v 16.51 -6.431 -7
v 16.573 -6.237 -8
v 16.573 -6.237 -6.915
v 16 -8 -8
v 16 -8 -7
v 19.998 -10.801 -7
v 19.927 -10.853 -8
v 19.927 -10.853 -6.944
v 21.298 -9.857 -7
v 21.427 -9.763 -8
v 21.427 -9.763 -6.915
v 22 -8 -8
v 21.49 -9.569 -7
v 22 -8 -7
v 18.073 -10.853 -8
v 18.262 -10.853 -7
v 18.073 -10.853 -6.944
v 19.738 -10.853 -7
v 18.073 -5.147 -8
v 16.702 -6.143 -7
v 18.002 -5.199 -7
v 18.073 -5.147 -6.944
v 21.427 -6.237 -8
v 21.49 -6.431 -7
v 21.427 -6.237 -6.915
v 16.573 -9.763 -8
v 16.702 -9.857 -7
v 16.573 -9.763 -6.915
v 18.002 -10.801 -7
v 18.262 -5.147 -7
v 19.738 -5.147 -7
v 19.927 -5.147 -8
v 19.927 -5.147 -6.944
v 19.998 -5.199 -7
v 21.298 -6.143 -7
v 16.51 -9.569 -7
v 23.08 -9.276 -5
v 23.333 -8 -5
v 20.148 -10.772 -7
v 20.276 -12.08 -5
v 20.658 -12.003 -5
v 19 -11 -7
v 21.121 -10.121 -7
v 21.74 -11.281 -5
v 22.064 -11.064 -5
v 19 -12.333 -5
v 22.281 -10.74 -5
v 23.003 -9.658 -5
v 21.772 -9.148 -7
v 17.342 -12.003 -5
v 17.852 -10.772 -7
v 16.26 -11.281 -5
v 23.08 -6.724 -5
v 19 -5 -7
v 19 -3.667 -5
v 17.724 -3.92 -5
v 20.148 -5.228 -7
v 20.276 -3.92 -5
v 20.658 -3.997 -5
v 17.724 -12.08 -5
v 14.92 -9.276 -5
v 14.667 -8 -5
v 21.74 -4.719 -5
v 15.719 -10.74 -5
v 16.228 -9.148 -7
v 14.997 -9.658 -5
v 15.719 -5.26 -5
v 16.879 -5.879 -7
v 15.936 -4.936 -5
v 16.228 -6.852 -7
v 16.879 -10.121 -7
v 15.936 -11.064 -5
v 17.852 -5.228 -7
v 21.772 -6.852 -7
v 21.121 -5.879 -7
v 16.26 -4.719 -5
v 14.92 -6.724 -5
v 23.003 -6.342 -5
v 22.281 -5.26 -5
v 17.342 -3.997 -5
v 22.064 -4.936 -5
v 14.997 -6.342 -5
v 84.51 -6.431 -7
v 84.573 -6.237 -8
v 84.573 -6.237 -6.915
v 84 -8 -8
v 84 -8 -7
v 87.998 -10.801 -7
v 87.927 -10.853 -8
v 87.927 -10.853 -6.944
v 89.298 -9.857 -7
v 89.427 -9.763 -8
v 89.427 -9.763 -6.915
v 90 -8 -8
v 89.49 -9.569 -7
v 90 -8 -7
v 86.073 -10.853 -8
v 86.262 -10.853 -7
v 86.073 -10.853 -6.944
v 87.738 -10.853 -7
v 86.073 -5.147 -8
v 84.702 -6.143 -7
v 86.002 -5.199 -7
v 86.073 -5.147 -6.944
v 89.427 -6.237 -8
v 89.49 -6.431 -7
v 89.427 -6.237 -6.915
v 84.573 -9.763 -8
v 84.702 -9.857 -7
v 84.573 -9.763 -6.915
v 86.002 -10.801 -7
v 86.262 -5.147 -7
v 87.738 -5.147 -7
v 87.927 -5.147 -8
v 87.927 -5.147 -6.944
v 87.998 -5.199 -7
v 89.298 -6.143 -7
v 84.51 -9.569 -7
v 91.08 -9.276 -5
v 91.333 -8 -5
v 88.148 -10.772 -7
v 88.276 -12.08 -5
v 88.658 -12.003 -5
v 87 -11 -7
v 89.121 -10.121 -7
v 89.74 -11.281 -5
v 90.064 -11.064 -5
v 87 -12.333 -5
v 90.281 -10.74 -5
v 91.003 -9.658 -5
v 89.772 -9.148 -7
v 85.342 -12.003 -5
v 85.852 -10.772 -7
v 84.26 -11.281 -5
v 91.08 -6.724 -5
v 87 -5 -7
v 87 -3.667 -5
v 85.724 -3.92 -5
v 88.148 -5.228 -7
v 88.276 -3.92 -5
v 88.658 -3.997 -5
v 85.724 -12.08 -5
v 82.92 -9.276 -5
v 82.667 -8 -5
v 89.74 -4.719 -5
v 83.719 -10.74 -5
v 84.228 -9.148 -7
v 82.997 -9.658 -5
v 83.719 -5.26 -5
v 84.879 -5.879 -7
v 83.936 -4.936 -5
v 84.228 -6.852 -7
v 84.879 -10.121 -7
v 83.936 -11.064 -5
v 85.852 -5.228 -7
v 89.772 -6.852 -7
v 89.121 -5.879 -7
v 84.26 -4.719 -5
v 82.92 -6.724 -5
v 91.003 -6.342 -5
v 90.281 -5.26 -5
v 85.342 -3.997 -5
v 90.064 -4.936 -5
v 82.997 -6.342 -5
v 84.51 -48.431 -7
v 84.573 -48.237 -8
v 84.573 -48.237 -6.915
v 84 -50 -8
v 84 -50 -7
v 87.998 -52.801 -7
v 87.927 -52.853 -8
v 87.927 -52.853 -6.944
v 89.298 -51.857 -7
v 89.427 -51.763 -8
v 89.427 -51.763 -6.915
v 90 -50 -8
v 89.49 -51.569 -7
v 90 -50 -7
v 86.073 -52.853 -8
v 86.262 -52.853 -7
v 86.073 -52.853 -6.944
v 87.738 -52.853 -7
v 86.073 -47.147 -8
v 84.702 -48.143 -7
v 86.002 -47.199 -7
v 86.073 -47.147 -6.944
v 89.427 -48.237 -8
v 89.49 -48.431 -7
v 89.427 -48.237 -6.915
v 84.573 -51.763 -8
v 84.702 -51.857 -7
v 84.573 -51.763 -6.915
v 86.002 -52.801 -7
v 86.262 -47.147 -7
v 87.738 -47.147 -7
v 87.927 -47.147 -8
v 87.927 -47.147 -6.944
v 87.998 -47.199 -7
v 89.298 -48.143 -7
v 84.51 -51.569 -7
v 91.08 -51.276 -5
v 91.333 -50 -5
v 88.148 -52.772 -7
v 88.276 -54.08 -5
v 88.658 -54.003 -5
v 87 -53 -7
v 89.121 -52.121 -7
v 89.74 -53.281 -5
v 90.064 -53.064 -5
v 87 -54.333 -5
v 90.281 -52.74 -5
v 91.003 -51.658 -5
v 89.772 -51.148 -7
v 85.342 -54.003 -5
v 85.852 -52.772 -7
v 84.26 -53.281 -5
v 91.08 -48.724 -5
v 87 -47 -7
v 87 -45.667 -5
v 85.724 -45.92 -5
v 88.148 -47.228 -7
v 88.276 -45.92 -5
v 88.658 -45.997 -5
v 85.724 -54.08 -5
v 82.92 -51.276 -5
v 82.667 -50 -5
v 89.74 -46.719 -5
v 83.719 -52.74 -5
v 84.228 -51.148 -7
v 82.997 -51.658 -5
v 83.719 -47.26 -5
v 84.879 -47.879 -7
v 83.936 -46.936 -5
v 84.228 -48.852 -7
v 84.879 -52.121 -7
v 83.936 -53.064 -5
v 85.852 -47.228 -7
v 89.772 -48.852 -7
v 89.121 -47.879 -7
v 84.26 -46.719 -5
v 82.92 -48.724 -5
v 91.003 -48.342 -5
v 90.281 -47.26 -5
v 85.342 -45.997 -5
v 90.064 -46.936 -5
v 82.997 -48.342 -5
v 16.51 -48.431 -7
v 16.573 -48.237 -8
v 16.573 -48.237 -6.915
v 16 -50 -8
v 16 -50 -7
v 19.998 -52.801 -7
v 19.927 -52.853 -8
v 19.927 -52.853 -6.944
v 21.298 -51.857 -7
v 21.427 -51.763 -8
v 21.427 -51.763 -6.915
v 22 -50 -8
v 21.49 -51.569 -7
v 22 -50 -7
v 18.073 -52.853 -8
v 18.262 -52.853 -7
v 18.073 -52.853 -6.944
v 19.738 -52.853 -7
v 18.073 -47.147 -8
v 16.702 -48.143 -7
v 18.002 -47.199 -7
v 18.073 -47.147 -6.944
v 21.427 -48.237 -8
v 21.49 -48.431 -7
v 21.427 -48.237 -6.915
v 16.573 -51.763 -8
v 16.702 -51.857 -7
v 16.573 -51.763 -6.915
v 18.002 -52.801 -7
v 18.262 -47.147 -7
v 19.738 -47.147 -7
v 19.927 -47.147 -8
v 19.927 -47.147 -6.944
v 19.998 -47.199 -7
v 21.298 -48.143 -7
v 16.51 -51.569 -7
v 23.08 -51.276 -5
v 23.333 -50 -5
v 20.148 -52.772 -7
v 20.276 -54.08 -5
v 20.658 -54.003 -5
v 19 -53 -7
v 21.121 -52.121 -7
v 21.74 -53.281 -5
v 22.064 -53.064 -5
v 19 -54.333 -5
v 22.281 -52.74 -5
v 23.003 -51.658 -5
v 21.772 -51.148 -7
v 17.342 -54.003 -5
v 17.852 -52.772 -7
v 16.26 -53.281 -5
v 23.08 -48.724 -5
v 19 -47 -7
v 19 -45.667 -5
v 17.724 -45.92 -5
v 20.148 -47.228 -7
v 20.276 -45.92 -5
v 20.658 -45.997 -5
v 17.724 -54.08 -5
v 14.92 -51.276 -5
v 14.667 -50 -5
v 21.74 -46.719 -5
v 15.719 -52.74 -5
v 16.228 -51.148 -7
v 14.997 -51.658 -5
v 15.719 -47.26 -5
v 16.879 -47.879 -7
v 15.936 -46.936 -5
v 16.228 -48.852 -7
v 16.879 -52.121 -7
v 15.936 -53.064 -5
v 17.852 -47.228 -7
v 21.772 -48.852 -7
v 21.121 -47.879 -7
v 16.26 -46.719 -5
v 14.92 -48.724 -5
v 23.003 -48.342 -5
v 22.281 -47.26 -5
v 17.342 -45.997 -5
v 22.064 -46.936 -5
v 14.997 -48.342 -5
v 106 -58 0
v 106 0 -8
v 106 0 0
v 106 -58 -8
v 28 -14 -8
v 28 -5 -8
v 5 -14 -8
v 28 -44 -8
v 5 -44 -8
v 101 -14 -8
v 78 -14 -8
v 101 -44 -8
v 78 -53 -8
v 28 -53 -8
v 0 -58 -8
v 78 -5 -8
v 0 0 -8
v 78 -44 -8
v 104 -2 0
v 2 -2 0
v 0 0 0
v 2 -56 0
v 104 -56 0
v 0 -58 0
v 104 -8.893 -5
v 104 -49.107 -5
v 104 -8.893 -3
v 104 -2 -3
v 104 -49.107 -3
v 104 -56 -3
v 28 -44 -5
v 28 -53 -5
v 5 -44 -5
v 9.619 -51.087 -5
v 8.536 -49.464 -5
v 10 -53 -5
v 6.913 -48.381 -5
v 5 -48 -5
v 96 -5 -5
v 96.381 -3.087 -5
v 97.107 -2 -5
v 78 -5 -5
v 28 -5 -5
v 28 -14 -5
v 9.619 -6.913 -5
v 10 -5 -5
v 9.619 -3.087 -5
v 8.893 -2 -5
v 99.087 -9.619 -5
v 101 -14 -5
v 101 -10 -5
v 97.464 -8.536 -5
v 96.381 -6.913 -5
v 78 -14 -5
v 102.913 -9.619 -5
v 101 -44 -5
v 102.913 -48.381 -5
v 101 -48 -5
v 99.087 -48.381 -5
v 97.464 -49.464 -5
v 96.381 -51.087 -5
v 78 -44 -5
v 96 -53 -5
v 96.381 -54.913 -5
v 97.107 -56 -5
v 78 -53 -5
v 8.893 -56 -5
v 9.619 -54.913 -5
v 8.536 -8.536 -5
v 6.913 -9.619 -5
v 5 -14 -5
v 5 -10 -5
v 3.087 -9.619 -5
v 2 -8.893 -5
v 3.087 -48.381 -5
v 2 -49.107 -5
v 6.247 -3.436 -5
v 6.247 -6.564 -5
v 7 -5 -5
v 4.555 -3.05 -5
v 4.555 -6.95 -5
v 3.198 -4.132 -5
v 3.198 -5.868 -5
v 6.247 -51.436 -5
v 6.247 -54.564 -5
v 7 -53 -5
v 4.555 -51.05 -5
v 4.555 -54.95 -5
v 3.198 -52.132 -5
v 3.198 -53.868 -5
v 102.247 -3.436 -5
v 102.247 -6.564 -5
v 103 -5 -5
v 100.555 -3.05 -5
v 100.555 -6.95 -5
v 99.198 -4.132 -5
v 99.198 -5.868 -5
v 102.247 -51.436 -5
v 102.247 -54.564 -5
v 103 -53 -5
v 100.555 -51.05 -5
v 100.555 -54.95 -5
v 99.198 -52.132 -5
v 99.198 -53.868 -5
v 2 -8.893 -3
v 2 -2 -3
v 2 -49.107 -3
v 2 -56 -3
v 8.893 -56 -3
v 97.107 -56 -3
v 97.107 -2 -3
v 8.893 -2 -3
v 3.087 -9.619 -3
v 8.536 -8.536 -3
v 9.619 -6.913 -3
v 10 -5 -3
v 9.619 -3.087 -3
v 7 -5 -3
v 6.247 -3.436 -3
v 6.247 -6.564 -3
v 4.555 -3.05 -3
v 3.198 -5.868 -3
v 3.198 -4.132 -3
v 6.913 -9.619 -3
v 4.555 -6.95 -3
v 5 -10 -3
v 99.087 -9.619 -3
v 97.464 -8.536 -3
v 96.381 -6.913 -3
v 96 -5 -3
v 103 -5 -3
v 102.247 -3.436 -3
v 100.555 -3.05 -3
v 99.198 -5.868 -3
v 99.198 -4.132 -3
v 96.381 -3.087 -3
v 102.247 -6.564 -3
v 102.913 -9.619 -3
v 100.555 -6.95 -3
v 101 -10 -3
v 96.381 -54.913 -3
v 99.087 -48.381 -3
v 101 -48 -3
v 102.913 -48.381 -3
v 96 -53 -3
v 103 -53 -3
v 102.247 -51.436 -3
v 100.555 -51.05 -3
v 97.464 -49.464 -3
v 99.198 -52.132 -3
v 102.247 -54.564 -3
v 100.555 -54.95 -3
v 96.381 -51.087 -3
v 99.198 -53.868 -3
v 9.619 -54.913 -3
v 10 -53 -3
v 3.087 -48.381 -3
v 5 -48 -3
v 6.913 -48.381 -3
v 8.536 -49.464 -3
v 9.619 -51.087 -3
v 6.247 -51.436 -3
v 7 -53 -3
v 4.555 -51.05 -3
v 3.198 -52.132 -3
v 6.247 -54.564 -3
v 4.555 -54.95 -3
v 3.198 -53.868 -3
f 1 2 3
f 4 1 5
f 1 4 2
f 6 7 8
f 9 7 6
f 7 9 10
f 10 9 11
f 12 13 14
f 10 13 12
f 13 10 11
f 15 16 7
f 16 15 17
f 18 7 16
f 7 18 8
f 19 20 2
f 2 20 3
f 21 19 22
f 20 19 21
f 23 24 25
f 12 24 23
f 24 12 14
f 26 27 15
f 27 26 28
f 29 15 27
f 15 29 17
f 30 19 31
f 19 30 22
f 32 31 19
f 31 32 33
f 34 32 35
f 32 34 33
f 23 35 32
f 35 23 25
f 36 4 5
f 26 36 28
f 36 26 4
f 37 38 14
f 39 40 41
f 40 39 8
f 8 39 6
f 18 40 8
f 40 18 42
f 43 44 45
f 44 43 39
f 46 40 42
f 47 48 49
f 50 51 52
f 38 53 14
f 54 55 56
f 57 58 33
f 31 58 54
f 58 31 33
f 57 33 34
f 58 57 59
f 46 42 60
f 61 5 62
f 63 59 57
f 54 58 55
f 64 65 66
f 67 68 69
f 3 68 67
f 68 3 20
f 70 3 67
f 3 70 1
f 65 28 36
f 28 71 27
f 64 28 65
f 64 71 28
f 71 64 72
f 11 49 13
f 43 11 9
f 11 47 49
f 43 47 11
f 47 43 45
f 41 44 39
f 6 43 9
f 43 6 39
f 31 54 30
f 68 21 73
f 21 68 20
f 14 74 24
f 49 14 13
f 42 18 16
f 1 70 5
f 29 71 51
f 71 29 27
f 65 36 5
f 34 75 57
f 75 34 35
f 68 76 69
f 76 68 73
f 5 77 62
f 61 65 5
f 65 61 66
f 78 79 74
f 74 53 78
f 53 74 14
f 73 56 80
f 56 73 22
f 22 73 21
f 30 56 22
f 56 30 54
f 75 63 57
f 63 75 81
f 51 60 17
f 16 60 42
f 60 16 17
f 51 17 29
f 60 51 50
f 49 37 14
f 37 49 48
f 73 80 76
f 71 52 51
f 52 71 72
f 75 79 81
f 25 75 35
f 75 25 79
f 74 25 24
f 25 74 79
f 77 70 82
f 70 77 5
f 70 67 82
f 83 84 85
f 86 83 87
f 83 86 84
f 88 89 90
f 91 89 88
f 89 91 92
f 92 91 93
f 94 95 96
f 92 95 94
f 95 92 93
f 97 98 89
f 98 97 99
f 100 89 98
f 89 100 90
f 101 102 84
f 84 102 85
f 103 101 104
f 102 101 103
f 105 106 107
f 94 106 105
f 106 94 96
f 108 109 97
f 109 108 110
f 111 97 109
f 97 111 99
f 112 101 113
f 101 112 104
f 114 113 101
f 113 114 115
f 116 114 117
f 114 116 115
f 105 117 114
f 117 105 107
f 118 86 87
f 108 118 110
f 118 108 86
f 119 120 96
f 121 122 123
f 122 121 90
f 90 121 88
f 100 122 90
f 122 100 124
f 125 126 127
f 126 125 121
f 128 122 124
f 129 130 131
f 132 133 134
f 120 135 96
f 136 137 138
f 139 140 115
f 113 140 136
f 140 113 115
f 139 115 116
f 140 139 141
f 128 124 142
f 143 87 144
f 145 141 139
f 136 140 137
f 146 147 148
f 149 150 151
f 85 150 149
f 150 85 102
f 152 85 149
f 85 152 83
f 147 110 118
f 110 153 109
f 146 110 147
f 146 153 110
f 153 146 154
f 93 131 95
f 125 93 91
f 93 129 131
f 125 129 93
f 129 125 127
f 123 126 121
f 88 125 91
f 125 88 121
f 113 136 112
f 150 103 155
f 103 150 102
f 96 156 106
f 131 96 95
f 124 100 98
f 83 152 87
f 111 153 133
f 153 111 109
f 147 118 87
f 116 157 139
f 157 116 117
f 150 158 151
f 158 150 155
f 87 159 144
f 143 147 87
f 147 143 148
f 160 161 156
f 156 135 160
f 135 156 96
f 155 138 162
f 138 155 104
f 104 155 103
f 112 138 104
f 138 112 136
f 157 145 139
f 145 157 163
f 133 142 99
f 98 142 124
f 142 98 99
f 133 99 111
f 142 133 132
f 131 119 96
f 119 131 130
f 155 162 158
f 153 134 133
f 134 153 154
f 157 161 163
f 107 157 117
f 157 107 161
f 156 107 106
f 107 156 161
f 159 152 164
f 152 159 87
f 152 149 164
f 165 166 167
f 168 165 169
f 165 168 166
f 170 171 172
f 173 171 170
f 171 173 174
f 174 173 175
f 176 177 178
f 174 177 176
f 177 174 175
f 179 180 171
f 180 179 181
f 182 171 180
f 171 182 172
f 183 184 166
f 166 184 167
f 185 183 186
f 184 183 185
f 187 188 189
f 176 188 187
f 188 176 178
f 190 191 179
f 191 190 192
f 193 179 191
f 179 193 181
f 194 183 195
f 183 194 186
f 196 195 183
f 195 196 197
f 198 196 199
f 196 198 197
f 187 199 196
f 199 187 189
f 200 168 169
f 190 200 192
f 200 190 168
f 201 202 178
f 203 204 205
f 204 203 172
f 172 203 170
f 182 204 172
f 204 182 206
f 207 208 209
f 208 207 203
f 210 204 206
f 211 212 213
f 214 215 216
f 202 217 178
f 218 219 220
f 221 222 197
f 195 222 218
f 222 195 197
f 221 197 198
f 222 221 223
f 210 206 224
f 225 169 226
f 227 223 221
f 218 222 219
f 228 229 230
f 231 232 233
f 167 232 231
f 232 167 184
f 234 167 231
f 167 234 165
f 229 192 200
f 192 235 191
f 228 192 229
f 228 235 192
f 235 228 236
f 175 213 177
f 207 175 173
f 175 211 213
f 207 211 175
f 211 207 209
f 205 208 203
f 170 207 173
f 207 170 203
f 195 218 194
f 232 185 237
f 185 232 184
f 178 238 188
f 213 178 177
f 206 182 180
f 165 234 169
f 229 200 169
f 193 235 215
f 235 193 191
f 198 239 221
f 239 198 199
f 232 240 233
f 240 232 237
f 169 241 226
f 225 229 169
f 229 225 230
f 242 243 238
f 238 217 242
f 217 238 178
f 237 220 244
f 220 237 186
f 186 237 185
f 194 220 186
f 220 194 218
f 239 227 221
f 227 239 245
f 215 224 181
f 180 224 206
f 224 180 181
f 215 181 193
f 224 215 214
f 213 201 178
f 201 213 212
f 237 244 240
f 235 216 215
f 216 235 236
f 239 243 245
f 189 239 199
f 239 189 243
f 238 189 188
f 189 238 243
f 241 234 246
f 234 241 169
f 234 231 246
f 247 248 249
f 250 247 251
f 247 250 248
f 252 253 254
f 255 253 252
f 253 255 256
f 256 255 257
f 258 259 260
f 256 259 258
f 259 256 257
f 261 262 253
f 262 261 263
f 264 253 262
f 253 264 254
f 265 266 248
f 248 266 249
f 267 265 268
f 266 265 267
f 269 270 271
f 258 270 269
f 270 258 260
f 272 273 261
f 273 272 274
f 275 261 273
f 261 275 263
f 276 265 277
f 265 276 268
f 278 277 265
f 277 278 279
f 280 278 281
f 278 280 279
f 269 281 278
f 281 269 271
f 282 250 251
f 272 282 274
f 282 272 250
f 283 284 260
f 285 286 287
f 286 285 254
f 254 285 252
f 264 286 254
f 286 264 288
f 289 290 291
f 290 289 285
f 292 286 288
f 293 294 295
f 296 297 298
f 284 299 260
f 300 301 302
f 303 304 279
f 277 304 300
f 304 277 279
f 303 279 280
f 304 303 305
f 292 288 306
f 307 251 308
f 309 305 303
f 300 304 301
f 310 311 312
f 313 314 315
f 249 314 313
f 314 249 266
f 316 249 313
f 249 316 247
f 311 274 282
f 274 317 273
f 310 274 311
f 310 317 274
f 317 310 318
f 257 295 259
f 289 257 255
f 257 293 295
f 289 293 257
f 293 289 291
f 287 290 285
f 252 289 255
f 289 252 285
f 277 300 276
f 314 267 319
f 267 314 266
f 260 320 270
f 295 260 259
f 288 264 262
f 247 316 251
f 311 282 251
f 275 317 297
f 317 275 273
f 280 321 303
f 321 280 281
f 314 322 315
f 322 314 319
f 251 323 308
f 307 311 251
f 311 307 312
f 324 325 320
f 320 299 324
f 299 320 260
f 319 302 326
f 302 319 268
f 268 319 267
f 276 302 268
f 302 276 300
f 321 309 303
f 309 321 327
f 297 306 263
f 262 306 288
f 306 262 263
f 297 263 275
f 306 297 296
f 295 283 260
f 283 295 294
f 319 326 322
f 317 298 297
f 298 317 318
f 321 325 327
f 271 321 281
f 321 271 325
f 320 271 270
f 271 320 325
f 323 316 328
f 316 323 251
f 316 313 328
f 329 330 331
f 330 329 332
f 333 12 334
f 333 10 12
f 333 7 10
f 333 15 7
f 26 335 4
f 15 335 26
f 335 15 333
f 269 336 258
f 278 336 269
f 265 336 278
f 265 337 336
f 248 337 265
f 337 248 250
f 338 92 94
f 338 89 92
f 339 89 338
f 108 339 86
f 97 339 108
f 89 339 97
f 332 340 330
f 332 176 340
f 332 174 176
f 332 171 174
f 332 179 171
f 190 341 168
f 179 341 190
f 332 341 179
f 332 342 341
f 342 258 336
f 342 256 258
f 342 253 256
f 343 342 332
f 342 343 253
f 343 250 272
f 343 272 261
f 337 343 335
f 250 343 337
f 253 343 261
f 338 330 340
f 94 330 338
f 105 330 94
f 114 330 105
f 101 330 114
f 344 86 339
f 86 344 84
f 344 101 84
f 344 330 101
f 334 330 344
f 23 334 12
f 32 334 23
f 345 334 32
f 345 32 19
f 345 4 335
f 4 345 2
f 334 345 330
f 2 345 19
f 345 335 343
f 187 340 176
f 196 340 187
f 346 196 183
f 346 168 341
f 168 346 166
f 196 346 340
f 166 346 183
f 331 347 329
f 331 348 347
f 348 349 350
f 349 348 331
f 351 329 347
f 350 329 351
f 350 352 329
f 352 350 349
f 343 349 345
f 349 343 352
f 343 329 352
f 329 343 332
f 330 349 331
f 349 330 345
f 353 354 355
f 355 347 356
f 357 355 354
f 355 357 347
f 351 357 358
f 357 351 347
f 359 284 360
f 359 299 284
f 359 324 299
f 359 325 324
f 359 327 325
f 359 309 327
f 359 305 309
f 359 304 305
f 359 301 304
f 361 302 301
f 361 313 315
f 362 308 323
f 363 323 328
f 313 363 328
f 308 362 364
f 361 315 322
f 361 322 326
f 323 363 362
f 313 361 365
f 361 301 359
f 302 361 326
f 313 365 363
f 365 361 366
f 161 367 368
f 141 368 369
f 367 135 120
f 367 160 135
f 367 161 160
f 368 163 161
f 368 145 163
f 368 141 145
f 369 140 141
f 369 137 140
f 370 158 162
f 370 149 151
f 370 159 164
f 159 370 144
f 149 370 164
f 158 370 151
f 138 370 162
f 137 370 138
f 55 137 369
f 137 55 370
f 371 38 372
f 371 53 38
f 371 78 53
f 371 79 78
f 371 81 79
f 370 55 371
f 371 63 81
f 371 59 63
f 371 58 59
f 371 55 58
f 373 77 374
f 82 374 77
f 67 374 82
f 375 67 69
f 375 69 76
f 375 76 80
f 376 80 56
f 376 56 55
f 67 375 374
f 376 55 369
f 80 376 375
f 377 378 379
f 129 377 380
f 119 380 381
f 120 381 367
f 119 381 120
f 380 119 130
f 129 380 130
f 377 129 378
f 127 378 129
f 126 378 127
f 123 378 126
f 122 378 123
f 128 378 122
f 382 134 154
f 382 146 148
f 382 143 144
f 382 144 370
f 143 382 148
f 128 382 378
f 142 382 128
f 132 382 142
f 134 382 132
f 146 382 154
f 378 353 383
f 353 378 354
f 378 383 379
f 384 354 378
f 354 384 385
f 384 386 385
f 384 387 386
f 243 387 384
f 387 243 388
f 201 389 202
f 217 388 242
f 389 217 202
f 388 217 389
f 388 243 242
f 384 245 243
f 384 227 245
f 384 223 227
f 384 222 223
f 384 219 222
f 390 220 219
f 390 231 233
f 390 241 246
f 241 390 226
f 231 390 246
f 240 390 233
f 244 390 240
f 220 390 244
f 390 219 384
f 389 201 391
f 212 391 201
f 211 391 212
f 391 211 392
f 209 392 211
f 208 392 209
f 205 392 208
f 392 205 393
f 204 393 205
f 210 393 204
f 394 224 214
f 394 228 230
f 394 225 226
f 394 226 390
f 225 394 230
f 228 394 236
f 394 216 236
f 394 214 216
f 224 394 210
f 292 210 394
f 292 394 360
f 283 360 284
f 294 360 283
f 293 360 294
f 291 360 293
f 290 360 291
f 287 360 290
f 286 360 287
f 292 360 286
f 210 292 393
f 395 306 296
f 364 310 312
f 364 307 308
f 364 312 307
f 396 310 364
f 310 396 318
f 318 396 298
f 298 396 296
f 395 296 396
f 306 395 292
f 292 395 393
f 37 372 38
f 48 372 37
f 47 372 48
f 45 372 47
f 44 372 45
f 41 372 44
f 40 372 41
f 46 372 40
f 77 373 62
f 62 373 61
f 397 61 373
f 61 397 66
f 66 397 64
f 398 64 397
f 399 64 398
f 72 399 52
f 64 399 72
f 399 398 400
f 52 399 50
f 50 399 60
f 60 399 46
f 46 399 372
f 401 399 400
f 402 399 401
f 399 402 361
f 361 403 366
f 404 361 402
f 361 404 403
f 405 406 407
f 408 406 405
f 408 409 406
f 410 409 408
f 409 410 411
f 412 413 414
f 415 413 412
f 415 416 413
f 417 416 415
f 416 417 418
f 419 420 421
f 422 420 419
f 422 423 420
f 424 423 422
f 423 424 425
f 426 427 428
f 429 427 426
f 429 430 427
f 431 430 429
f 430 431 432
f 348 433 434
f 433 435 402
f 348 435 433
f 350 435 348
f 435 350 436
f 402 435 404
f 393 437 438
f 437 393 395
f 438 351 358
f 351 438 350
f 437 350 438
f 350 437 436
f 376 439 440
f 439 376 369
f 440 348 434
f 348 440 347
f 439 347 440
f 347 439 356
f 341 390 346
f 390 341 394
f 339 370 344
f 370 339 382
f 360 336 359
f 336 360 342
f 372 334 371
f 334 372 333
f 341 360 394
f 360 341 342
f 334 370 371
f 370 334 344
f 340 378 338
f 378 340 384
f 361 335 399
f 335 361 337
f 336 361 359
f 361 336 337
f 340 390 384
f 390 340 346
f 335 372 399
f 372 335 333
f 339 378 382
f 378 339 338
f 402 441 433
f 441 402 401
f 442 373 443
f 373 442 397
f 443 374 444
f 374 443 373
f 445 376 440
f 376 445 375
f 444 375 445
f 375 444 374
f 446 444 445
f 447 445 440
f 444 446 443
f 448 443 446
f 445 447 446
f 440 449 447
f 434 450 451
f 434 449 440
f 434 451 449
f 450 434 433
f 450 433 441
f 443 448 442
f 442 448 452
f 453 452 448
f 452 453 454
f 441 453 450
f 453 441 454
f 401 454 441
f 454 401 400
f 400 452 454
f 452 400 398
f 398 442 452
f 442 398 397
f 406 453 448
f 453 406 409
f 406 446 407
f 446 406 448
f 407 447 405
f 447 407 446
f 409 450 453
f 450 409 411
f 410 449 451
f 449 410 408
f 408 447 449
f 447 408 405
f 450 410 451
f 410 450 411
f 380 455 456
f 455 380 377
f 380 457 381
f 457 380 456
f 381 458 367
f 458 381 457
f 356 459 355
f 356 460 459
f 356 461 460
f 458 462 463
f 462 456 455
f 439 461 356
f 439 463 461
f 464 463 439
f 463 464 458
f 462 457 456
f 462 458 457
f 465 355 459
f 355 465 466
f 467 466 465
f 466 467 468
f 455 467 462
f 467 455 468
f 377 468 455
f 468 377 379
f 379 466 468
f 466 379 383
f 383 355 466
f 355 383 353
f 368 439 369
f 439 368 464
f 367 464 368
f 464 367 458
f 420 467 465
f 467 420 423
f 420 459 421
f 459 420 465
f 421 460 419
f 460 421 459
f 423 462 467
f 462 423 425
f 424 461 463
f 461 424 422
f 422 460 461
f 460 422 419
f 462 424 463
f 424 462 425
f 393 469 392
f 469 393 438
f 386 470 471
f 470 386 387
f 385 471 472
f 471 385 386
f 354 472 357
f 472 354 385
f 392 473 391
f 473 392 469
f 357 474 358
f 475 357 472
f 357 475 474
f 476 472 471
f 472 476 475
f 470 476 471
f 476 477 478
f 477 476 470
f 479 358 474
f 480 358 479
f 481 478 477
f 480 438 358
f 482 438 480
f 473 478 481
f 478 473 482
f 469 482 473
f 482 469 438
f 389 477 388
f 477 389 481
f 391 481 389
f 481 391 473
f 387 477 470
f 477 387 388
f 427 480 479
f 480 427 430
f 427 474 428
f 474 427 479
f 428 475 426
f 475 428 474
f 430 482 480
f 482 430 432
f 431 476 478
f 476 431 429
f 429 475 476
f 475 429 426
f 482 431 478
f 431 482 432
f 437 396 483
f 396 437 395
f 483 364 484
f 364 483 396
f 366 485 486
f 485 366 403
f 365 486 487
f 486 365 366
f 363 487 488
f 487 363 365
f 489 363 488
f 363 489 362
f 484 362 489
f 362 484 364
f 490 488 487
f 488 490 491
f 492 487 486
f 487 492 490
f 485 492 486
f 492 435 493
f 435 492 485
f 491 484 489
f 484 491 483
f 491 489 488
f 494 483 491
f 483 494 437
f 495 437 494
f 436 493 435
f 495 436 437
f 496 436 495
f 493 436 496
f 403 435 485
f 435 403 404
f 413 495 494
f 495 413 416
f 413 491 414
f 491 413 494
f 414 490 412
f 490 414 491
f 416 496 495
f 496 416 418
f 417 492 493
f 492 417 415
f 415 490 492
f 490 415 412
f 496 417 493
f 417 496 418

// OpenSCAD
// Give the PCB Measurements below.
// DO NOT ADD ANY EXTRA MARGIN AS THAT IS ALREADY CALCULATED

pcbwidth = 100;
pcblength = 52;

// DO NOT CHANGE ANYTHING BELOW THIS LINE
rotate(a=[180,0,0]){
	difference(){
		cube([pcbwidth+6,pcblength+6,8]);
		translate([2,2,0])
			cube([pcbwidth+2,pcblength+2,5]);
		translate([19,8,4],center=true){
			cylinder(h=10,r=3);
			cylinder(h=3,r1=5,r2=3);
		}
		translate([pcbwidth-13,8,4],center=true){
			cylinder(h=10,r=3);
			cylinder(h=3,r1=5,r2=3);
		}
		translate([pcbwidth-13,pcblength-2,4],center=true){
			cylinder(h=10,r=3);
			cylinder(h=3,r1=5,r2=3);
		}
		translate([19,pcblength-2,4],center=true){
			cylinder(h=10,r=3);
			cylinder(h=3,r1=5,r2=3);
		}
		translate([28,5,0])
			cube([pcbwidth-50,pcblength-4,8]);
		translate([5,14,0])
			cube([pcbwidth-4,pcblength-22,8]);
	}
	translate([5,5,3])
	difference(){
		cylinder(h=5,r=5);
		cylinder(h=5,r=2);
	}
	translate([pcbwidth+1,5,3])
	difference(){
		cylinder(h=5,r=5);
		cylinder(h=5,r=2);
	}
	translate([pcbwidth+1,pcblength+1,3])
	difference(){
		cylinder(h=5,r=5);
		cylinder(h=5,r=2);
	}
	translate([5,pcblength+1,3])
	difference(){
		cylinder(h=5,r=5);
		cylinder(h=5,r=2);
	}
	echo("The PCB has a dimention of ", pcbwidth, "x", pcblength, "mm");
	echo("The PCBHolder will have a final dimension of ", pcbwidth+6, "x", pcblength+6, "mm");
}
